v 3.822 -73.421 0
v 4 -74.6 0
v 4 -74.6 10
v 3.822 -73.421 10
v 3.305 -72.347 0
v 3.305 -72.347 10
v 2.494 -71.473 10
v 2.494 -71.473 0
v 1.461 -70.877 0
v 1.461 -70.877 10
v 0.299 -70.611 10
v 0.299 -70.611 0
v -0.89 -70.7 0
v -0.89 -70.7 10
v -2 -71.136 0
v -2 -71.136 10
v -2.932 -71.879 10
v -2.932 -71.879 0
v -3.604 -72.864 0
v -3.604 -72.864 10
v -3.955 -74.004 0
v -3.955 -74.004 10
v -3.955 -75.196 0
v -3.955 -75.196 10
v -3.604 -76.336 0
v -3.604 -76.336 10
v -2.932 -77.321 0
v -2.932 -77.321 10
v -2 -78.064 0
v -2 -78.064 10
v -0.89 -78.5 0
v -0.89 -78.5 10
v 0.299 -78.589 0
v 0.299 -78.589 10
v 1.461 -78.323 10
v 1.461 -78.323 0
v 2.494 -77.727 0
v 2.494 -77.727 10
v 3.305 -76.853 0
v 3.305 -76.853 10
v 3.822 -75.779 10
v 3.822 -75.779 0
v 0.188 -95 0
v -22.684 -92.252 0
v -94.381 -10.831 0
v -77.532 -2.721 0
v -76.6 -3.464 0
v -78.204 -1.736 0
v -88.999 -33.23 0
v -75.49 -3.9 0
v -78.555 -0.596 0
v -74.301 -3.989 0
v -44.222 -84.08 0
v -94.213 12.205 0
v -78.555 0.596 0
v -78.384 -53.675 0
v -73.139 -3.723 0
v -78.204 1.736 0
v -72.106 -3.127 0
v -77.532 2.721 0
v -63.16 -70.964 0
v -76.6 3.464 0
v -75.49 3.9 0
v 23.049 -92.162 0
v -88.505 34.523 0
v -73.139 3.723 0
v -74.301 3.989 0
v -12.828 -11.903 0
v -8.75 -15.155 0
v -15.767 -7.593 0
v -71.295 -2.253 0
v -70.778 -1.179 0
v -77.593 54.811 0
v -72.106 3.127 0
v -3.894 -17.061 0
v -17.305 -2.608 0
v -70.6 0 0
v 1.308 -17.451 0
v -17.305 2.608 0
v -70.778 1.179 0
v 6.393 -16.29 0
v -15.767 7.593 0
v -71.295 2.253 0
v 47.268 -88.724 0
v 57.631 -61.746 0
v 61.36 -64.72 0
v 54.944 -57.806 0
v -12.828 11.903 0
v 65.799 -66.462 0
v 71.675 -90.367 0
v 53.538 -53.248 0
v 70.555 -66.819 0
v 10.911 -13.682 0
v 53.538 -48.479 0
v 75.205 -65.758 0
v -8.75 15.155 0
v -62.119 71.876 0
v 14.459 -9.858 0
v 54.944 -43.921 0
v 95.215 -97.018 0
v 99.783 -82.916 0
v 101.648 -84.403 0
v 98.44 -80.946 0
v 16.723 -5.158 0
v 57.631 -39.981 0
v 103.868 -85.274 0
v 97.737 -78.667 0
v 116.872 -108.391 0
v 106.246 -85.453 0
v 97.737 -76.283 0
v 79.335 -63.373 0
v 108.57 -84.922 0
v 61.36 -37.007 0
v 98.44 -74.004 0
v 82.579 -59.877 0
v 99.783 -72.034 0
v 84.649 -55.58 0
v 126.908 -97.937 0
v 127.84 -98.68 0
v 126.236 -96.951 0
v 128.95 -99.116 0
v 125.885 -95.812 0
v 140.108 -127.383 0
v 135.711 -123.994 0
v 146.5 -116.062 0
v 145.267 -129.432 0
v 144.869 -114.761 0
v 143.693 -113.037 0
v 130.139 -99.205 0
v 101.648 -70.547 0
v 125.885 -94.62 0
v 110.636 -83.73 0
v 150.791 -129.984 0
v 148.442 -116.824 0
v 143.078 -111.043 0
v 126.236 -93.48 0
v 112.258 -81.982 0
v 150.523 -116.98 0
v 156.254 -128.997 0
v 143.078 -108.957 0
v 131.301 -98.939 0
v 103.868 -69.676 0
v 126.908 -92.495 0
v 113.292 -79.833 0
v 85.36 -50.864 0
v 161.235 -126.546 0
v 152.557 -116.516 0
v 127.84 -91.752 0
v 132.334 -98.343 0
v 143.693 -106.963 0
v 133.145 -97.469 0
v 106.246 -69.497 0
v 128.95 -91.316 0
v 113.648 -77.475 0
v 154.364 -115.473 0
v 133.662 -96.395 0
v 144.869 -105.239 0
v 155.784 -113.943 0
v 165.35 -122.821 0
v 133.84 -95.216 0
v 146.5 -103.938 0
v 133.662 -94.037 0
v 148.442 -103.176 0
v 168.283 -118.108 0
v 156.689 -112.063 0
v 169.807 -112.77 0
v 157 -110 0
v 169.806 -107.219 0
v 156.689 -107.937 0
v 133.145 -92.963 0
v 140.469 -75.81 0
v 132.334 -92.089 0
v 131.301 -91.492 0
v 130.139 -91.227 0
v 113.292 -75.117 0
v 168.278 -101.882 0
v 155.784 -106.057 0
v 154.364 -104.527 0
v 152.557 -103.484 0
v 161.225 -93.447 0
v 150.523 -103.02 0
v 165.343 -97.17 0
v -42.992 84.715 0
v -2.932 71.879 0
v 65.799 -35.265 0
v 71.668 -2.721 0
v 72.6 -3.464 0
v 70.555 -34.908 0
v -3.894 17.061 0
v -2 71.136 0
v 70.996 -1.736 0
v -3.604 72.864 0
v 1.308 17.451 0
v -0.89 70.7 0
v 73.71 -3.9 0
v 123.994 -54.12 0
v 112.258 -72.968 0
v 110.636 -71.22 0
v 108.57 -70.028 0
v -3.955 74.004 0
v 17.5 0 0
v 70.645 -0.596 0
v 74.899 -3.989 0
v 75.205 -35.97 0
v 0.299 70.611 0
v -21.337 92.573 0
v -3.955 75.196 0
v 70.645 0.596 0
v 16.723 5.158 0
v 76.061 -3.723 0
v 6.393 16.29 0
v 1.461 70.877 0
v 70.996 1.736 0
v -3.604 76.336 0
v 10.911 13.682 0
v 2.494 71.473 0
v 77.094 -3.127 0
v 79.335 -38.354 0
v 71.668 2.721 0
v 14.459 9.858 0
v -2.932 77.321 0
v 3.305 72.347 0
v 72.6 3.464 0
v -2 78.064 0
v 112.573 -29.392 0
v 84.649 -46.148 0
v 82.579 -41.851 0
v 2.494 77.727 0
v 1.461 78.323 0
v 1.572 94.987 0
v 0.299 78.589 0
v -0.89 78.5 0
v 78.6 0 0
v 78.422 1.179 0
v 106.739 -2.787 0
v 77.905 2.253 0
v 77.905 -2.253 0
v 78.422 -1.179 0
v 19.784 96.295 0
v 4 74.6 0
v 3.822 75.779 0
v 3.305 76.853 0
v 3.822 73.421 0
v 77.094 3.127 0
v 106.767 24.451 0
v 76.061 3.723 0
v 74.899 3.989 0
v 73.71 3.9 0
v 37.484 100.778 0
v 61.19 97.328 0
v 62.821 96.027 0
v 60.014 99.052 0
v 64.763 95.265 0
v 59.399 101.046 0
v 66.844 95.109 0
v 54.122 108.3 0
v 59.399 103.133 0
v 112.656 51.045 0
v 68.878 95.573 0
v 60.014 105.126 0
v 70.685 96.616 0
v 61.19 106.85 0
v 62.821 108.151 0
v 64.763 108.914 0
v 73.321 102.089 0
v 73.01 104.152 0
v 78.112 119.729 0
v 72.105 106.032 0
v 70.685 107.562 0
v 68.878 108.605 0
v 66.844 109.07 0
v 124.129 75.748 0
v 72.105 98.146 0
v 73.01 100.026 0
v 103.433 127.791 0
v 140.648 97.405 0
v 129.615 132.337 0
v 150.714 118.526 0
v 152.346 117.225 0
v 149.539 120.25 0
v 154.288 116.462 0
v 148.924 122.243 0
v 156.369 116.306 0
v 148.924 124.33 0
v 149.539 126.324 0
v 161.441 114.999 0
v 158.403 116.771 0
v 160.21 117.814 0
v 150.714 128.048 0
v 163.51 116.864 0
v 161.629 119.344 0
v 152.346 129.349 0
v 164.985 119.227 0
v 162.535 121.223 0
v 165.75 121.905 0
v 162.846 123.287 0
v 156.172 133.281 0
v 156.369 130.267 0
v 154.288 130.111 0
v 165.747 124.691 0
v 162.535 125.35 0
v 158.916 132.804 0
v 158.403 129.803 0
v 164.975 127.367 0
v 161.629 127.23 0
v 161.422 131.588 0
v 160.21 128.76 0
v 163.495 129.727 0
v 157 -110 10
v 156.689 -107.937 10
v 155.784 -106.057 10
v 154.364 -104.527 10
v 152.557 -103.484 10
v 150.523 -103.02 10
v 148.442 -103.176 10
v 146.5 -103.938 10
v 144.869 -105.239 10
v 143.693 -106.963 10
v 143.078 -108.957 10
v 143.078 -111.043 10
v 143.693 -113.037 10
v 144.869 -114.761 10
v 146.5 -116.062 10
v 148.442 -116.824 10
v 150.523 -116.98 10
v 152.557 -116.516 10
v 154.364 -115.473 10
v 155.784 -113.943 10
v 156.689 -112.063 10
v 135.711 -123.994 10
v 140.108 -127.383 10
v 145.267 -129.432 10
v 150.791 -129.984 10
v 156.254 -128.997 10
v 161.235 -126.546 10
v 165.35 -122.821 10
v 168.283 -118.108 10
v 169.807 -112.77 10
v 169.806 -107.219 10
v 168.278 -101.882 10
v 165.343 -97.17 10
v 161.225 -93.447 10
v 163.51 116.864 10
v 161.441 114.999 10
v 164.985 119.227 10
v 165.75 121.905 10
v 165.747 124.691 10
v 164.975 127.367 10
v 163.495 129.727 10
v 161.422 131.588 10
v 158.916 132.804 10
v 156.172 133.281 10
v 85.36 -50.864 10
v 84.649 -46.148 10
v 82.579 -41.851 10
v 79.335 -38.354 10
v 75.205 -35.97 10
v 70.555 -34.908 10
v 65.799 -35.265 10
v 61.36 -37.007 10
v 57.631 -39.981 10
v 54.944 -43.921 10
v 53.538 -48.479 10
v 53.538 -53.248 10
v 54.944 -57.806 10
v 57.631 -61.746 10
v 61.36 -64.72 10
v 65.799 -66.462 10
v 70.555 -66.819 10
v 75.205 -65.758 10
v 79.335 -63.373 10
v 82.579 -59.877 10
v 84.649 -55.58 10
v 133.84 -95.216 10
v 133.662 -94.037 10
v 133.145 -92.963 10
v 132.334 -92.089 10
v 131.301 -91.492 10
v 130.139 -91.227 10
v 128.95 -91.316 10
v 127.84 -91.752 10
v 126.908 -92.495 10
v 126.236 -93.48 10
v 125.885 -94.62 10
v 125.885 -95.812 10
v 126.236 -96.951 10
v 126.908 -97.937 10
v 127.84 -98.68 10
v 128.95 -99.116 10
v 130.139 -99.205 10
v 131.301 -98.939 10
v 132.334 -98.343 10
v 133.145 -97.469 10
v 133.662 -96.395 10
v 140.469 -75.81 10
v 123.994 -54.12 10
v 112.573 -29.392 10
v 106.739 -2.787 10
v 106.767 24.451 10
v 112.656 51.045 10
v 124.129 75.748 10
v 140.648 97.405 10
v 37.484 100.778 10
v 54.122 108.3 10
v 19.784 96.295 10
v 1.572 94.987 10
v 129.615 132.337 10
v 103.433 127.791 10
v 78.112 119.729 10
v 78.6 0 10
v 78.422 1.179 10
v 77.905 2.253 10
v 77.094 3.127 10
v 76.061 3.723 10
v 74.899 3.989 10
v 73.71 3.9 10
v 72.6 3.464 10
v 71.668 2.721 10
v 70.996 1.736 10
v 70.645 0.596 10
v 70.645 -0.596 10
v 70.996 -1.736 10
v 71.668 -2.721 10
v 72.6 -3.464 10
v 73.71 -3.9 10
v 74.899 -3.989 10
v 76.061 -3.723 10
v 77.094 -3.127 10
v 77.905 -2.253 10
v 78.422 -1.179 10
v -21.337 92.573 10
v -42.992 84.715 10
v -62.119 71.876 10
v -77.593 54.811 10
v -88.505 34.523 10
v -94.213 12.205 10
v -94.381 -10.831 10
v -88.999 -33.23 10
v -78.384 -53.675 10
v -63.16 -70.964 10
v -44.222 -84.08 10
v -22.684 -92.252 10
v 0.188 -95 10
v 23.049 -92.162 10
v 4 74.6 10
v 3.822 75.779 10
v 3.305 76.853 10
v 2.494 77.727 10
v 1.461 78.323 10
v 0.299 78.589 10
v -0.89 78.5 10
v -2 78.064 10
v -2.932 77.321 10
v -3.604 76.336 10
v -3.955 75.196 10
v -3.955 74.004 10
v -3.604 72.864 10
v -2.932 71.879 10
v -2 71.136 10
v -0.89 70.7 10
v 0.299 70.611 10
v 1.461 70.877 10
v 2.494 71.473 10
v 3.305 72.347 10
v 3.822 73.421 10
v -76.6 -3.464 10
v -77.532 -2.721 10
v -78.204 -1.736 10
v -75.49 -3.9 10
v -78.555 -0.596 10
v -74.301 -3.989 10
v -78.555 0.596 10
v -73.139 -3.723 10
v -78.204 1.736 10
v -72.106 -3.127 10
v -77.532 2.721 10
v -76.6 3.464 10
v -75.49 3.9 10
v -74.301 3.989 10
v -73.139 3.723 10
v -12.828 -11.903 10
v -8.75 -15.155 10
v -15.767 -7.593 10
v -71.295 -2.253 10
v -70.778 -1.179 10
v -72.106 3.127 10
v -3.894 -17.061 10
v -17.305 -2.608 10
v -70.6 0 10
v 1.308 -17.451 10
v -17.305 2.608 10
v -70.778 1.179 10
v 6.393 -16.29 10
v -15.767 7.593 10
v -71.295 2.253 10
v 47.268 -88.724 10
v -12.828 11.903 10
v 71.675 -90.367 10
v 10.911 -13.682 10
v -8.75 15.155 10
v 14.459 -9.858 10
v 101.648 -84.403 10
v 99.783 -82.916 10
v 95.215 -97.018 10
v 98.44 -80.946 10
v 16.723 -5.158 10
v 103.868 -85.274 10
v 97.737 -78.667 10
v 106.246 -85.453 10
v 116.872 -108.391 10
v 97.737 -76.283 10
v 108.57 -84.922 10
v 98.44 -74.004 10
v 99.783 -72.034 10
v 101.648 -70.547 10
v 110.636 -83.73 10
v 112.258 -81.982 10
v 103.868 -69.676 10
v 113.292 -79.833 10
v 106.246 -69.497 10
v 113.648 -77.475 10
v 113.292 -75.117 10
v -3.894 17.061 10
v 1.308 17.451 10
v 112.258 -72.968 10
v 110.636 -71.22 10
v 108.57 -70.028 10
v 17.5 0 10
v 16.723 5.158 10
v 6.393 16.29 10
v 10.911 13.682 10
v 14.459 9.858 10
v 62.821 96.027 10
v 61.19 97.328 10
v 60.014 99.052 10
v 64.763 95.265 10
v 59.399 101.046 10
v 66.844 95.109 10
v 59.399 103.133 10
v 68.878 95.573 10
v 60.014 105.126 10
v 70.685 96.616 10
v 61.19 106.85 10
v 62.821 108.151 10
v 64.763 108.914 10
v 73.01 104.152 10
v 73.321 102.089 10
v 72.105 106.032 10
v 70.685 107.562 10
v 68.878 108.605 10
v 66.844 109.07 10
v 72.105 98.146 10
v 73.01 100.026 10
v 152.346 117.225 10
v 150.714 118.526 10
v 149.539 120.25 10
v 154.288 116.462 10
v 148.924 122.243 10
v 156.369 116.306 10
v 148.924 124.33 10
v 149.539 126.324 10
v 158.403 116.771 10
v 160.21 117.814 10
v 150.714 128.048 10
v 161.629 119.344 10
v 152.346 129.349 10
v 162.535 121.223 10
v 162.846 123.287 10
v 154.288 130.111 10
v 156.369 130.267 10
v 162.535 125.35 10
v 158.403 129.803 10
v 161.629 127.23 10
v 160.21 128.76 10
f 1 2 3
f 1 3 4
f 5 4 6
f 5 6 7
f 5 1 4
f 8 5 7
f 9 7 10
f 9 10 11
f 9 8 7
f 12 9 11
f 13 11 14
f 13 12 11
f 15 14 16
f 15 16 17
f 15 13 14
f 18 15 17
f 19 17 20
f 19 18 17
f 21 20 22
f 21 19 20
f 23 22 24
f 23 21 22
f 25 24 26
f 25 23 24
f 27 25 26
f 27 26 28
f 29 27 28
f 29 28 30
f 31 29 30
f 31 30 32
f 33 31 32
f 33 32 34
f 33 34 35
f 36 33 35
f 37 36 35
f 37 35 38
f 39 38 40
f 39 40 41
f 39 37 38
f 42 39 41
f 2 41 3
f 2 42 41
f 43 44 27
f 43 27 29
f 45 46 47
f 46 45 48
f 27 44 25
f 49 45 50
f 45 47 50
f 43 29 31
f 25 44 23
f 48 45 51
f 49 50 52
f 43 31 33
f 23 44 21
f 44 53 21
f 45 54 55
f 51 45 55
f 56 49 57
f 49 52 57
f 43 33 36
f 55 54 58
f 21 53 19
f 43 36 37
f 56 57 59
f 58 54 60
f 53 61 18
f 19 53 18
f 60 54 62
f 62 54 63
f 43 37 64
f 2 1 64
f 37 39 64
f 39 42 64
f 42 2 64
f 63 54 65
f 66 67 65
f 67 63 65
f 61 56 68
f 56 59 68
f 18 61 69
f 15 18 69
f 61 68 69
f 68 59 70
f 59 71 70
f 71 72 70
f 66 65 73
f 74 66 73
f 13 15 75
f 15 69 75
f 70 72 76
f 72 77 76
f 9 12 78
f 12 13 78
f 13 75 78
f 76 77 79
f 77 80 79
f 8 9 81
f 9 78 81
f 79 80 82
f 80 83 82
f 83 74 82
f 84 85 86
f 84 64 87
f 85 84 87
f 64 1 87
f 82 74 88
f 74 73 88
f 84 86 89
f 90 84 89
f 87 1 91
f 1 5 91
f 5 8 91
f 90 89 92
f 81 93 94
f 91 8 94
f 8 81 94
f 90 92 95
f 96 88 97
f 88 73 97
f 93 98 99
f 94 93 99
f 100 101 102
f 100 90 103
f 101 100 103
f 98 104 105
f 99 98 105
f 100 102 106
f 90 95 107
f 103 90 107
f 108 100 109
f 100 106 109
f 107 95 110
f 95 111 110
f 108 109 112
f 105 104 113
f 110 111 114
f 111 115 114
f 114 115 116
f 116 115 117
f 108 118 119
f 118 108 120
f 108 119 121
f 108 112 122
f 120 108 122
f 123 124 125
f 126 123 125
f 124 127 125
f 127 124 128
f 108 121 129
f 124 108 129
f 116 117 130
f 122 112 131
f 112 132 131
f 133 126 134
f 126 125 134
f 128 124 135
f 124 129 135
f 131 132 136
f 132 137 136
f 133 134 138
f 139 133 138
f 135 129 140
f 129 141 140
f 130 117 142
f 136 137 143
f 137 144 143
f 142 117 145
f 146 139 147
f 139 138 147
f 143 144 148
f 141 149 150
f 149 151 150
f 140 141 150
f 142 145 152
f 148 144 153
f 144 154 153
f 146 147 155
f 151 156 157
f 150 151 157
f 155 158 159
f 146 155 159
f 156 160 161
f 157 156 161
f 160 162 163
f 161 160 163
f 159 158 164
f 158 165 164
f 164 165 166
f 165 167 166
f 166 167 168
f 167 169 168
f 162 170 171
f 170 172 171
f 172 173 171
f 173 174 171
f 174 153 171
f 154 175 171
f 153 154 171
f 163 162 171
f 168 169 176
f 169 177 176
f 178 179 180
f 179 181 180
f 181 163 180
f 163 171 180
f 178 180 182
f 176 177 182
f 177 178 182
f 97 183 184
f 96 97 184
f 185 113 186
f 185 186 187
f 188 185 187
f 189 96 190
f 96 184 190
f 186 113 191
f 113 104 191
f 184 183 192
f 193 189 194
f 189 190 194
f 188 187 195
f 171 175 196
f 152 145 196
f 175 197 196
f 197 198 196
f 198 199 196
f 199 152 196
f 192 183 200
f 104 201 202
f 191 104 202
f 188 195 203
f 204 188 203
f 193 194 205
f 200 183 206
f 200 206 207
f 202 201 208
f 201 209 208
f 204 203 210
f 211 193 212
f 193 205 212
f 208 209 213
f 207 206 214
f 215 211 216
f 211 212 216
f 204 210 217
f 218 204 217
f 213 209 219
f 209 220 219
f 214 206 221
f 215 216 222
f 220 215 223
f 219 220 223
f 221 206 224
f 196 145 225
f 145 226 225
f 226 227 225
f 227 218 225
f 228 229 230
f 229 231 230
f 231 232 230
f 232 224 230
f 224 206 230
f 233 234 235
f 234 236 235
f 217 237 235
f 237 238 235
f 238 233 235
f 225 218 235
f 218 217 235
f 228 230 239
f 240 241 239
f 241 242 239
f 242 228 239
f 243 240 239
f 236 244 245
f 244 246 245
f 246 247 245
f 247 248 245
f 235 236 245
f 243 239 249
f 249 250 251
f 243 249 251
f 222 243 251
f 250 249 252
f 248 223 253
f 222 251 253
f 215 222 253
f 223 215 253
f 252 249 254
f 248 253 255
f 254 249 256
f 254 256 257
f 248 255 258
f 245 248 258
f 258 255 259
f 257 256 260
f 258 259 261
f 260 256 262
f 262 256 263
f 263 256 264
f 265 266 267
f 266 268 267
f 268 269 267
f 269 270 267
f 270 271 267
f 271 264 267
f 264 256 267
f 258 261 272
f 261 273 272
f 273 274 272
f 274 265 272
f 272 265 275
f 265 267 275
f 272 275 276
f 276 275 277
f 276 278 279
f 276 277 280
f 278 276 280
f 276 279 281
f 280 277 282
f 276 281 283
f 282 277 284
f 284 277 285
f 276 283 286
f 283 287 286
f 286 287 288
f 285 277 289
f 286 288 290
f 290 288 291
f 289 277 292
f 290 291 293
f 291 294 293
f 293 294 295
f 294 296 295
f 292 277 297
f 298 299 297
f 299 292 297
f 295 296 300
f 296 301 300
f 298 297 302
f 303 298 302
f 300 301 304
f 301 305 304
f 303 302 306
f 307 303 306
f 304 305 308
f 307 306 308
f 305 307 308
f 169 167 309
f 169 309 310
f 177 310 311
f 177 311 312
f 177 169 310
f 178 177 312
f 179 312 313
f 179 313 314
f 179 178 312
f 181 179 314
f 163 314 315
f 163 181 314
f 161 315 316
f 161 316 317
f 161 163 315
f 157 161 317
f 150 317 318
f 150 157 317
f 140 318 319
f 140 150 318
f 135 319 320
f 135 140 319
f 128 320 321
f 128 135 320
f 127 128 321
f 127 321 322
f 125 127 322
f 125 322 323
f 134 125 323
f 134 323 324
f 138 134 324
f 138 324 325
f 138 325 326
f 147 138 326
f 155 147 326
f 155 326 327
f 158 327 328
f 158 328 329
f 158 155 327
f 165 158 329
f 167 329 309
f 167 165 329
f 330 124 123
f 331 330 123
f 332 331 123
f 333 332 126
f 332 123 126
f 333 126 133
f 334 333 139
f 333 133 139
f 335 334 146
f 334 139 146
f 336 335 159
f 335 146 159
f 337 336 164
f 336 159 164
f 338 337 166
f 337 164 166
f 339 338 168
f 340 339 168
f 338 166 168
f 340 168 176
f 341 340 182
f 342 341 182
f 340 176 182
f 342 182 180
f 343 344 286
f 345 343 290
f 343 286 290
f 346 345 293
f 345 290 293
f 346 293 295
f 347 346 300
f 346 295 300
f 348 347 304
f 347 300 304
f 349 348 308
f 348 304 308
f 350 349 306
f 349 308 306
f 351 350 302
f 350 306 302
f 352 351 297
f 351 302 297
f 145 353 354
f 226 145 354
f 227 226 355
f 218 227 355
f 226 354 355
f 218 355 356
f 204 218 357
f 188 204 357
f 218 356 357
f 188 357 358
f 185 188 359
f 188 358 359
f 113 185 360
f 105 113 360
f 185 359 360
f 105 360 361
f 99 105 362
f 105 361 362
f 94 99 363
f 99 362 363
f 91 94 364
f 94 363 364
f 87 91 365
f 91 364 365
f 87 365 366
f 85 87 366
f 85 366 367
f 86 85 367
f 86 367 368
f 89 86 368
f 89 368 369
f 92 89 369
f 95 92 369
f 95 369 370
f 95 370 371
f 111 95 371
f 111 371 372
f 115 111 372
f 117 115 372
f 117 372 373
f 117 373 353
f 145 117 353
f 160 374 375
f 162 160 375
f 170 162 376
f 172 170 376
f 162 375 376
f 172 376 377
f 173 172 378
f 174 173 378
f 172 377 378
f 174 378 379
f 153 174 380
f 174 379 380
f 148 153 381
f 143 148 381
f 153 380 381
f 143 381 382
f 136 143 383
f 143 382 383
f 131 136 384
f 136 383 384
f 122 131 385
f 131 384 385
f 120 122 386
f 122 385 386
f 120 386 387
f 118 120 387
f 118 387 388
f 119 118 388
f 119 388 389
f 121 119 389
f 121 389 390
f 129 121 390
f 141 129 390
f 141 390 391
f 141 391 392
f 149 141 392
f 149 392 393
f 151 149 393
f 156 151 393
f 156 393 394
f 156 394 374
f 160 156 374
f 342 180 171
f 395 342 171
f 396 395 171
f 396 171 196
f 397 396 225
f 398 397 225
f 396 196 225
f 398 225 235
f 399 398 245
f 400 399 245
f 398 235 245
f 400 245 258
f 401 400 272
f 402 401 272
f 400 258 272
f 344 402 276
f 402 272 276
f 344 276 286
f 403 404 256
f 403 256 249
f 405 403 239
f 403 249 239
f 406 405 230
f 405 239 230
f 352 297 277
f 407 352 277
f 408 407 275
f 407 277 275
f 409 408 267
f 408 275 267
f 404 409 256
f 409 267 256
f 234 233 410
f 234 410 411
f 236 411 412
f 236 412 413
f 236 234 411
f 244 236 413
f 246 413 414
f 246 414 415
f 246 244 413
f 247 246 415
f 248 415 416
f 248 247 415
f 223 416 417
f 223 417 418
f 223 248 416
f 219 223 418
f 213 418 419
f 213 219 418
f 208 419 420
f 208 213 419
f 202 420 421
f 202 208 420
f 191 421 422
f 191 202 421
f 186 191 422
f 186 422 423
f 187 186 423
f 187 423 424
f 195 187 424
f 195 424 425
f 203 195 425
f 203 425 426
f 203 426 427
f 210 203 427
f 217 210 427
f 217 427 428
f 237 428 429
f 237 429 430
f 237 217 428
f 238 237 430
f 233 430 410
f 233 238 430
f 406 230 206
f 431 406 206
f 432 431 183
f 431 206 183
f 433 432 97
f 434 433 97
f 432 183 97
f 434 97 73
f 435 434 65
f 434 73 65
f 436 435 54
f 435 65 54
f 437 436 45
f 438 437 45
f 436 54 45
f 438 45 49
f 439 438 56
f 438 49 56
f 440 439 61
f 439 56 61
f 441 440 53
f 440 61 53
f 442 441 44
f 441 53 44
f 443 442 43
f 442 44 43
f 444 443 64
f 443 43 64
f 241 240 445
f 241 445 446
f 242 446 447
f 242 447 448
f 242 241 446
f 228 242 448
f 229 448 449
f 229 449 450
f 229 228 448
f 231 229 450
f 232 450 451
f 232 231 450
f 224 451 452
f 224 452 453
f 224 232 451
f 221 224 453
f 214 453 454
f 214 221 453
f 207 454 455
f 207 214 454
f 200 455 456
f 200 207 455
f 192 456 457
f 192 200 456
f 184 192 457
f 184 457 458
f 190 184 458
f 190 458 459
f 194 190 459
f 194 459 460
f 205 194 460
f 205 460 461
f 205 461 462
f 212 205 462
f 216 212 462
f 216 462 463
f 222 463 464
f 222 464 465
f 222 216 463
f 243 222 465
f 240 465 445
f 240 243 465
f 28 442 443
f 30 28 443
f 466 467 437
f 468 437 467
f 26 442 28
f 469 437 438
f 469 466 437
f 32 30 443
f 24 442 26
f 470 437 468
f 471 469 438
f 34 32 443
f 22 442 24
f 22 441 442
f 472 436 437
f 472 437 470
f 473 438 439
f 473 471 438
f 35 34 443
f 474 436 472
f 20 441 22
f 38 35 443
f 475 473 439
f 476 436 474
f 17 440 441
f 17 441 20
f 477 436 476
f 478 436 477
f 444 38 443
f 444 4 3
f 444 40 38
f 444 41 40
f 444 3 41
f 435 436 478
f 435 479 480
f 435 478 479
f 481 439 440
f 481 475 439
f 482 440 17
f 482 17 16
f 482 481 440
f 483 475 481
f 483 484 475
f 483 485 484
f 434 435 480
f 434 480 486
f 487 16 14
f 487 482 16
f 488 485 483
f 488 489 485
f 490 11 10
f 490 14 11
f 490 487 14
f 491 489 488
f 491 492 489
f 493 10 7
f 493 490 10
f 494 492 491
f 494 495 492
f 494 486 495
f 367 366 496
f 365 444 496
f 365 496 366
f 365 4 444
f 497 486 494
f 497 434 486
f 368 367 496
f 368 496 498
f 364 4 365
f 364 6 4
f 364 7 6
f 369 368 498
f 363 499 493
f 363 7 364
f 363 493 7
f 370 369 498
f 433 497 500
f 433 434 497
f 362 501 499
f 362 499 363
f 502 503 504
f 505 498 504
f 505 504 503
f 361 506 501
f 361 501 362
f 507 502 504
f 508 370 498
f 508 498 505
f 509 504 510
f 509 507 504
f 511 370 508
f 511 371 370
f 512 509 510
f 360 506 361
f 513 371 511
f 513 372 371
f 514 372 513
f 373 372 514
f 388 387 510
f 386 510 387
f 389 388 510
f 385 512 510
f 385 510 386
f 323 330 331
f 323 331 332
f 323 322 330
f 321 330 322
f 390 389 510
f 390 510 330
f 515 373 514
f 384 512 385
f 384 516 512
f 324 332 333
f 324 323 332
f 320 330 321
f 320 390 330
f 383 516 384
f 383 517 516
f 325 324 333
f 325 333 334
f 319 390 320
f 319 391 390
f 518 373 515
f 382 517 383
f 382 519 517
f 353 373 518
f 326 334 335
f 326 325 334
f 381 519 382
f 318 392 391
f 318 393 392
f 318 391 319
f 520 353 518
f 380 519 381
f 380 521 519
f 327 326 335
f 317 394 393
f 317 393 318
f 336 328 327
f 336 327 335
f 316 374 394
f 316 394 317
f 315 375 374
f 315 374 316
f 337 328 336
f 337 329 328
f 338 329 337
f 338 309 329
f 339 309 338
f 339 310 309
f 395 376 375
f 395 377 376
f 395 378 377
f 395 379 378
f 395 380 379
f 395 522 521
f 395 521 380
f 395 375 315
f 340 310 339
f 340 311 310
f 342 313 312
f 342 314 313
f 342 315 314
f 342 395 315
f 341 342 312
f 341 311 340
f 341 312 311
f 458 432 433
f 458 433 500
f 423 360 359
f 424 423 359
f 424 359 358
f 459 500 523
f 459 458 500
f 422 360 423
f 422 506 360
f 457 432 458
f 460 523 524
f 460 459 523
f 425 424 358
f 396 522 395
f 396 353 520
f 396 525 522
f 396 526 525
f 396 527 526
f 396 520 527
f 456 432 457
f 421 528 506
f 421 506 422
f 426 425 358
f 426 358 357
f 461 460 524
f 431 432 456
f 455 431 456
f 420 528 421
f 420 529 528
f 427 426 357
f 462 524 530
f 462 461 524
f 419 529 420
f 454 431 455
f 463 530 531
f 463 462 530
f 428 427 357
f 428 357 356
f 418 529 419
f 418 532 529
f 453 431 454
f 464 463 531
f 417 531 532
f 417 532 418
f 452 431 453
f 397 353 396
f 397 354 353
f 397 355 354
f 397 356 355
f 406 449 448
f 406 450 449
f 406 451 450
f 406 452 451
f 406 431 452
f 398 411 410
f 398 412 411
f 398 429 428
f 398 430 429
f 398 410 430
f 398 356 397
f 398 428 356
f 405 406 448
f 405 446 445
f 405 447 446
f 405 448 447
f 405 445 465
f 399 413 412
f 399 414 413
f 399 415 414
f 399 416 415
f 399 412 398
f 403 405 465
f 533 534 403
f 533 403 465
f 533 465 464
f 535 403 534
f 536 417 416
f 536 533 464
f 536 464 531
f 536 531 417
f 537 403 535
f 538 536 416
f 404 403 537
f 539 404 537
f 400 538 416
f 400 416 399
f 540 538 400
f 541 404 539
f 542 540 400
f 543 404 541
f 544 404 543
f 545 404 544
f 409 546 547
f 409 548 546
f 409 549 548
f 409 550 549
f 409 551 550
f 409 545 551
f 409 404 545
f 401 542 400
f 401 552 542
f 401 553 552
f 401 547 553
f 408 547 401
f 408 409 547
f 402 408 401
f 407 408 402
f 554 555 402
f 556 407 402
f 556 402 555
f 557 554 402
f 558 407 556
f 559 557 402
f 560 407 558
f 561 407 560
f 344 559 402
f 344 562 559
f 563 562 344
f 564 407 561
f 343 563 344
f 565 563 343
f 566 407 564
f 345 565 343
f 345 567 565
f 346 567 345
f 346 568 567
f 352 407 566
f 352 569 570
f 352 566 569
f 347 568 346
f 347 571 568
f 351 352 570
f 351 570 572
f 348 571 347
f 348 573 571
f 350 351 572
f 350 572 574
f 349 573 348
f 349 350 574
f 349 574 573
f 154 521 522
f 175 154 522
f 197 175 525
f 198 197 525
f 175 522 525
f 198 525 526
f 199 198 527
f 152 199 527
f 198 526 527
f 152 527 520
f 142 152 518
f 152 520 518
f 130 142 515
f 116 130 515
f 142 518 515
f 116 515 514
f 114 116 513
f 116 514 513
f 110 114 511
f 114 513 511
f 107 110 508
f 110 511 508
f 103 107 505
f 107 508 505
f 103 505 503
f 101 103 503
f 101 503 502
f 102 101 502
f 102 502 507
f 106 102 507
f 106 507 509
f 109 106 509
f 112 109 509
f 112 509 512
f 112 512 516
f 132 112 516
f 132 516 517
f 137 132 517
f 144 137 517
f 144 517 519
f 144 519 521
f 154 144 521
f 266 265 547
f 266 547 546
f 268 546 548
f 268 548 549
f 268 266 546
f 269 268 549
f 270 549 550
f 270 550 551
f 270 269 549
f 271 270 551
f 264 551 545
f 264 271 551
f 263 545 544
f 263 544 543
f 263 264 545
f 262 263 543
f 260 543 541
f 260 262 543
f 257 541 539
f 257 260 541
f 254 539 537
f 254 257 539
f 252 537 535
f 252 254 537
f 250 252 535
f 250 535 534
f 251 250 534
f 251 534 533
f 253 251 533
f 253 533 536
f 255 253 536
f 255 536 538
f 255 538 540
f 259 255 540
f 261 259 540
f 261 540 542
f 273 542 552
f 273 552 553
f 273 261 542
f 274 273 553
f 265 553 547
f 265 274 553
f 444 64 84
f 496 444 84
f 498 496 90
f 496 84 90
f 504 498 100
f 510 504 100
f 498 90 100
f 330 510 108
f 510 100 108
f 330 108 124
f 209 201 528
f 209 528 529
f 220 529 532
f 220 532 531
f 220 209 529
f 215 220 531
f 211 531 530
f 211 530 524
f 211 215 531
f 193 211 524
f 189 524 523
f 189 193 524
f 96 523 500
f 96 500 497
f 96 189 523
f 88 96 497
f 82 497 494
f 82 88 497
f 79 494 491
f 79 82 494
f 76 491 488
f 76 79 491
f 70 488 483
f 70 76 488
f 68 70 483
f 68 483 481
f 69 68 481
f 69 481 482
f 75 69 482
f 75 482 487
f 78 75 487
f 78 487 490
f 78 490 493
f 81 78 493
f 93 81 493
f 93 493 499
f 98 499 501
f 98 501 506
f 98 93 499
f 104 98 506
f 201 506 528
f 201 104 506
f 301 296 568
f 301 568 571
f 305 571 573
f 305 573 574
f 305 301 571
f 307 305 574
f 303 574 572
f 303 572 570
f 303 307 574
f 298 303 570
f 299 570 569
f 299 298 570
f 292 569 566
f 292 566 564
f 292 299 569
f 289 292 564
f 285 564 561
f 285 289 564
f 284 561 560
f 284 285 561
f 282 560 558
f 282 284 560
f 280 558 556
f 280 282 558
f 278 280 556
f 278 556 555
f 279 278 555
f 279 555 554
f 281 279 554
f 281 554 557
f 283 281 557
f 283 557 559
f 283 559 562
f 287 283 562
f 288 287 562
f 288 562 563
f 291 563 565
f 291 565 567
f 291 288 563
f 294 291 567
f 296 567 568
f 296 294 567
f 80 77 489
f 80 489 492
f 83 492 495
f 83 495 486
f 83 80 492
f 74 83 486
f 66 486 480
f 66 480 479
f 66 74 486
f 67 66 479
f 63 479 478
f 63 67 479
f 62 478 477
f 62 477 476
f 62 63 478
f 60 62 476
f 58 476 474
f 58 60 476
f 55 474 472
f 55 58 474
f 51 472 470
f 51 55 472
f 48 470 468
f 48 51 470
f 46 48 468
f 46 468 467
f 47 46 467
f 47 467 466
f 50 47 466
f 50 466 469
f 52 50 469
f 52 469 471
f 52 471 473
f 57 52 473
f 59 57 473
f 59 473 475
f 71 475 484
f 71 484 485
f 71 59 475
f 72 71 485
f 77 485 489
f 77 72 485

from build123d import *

# Parameters (mm, degrees)
SKETCH1_R           = 7
SKETCH1_R_2         = 4
SKETCH1_R_3         = 17.5
BOSS_EXTRUDE1_DEPTH = 10
SKETCH4_R           = 4
SKETCH4_R_2         = 8
SKETCH4_R_3         = 16
CUT_EXTRUDE1_DEPTH  = 11


with BuildPart() as part:
    # Sketch1 → Boss-Extrude1 (new body)
    with BuildSketch(Plane.XY):
        with BuildLine():
            ThreePointArc((1.572195793, 94.986989637), (-94.380567411, -10.83090463), (23.048944019, -92.161522229))
            ThreePointArc((23.048944019, -92.161522229), (83.617990825, -93.079348945), (135.711425994, -123.994164958))
            ThreePointArc((135.711425994, -123.994164958), (165.350102595, -122.820856068), (161.225161537, -93.447183066))
            ThreePointArc((161.225161537, -93.447183066), (106.014165413, 10.833093568), (161.441107802, 114.998751274))
            ThreePointArc((161.441107802, 114.998751274), (165.454566443, 126.056147345), (156.171848547, 133.281450563))
            ThreePointArc((156.171848547, 133.281450563), (103.433194213, 127.791254655), (54.122076862, 108.299676532))
            ThreePointArc((54.122076862, 108.299676532), (28.73316338, 98.145871106), (1.572195793, 94.986989637))
        make_face()
        with Locations((66.321036094, 102.089205288)):
            Circle(SKETCH1_R, mode=Mode.SUBTRACT)
        with Locations((155.845687485, 123.28677103)):
            Circle(SKETCH1_R, mode=Mode.SUBTRACT)
        with Locations((150, -110)):
            Circle(SKETCH1_R, mode=Mode.SUBTRACT)
        with Locations((0, 74.6)):
            Circle(SKETCH1_R_2, mode=Mode.SUBTRACT)
        with Locations((74.6, 0)):
            Circle(SKETCH1_R_2, mode=Mode.SUBTRACT)
        with Locations((0, -74.6)):
            Circle(SKETCH1_R_2, mode=Mode.SUBTRACT)
        with Locations((-74.6, 0)):
            Circle(SKETCH1_R_2, mode=Mode.SUBTRACT)
        Circle(SKETCH1_R_3, mode=Mode.SUBTRACT)
    extrude(amount=BOSS_EXTRUDE1_DEPTH)

    # Sketch4 → Cut-Extrude1 (cut, through all)
    with BuildSketch(Plane.XY.offset(10)):
        with Locations((129.839875104, -95.215908409)):
            Circle(SKETCH4_R)
        with Locations((105.647725228, -77.4749985)):
            Circle(SKETCH4_R_2)
        with Locations((69.359500414, -50.863633637)):
            Circle(SKETCH4_R_3)
    extrude(amount=-CUT_EXTRUDE1_DEPTH, mode=Mode.SUBTRACT)


solid = part.part
